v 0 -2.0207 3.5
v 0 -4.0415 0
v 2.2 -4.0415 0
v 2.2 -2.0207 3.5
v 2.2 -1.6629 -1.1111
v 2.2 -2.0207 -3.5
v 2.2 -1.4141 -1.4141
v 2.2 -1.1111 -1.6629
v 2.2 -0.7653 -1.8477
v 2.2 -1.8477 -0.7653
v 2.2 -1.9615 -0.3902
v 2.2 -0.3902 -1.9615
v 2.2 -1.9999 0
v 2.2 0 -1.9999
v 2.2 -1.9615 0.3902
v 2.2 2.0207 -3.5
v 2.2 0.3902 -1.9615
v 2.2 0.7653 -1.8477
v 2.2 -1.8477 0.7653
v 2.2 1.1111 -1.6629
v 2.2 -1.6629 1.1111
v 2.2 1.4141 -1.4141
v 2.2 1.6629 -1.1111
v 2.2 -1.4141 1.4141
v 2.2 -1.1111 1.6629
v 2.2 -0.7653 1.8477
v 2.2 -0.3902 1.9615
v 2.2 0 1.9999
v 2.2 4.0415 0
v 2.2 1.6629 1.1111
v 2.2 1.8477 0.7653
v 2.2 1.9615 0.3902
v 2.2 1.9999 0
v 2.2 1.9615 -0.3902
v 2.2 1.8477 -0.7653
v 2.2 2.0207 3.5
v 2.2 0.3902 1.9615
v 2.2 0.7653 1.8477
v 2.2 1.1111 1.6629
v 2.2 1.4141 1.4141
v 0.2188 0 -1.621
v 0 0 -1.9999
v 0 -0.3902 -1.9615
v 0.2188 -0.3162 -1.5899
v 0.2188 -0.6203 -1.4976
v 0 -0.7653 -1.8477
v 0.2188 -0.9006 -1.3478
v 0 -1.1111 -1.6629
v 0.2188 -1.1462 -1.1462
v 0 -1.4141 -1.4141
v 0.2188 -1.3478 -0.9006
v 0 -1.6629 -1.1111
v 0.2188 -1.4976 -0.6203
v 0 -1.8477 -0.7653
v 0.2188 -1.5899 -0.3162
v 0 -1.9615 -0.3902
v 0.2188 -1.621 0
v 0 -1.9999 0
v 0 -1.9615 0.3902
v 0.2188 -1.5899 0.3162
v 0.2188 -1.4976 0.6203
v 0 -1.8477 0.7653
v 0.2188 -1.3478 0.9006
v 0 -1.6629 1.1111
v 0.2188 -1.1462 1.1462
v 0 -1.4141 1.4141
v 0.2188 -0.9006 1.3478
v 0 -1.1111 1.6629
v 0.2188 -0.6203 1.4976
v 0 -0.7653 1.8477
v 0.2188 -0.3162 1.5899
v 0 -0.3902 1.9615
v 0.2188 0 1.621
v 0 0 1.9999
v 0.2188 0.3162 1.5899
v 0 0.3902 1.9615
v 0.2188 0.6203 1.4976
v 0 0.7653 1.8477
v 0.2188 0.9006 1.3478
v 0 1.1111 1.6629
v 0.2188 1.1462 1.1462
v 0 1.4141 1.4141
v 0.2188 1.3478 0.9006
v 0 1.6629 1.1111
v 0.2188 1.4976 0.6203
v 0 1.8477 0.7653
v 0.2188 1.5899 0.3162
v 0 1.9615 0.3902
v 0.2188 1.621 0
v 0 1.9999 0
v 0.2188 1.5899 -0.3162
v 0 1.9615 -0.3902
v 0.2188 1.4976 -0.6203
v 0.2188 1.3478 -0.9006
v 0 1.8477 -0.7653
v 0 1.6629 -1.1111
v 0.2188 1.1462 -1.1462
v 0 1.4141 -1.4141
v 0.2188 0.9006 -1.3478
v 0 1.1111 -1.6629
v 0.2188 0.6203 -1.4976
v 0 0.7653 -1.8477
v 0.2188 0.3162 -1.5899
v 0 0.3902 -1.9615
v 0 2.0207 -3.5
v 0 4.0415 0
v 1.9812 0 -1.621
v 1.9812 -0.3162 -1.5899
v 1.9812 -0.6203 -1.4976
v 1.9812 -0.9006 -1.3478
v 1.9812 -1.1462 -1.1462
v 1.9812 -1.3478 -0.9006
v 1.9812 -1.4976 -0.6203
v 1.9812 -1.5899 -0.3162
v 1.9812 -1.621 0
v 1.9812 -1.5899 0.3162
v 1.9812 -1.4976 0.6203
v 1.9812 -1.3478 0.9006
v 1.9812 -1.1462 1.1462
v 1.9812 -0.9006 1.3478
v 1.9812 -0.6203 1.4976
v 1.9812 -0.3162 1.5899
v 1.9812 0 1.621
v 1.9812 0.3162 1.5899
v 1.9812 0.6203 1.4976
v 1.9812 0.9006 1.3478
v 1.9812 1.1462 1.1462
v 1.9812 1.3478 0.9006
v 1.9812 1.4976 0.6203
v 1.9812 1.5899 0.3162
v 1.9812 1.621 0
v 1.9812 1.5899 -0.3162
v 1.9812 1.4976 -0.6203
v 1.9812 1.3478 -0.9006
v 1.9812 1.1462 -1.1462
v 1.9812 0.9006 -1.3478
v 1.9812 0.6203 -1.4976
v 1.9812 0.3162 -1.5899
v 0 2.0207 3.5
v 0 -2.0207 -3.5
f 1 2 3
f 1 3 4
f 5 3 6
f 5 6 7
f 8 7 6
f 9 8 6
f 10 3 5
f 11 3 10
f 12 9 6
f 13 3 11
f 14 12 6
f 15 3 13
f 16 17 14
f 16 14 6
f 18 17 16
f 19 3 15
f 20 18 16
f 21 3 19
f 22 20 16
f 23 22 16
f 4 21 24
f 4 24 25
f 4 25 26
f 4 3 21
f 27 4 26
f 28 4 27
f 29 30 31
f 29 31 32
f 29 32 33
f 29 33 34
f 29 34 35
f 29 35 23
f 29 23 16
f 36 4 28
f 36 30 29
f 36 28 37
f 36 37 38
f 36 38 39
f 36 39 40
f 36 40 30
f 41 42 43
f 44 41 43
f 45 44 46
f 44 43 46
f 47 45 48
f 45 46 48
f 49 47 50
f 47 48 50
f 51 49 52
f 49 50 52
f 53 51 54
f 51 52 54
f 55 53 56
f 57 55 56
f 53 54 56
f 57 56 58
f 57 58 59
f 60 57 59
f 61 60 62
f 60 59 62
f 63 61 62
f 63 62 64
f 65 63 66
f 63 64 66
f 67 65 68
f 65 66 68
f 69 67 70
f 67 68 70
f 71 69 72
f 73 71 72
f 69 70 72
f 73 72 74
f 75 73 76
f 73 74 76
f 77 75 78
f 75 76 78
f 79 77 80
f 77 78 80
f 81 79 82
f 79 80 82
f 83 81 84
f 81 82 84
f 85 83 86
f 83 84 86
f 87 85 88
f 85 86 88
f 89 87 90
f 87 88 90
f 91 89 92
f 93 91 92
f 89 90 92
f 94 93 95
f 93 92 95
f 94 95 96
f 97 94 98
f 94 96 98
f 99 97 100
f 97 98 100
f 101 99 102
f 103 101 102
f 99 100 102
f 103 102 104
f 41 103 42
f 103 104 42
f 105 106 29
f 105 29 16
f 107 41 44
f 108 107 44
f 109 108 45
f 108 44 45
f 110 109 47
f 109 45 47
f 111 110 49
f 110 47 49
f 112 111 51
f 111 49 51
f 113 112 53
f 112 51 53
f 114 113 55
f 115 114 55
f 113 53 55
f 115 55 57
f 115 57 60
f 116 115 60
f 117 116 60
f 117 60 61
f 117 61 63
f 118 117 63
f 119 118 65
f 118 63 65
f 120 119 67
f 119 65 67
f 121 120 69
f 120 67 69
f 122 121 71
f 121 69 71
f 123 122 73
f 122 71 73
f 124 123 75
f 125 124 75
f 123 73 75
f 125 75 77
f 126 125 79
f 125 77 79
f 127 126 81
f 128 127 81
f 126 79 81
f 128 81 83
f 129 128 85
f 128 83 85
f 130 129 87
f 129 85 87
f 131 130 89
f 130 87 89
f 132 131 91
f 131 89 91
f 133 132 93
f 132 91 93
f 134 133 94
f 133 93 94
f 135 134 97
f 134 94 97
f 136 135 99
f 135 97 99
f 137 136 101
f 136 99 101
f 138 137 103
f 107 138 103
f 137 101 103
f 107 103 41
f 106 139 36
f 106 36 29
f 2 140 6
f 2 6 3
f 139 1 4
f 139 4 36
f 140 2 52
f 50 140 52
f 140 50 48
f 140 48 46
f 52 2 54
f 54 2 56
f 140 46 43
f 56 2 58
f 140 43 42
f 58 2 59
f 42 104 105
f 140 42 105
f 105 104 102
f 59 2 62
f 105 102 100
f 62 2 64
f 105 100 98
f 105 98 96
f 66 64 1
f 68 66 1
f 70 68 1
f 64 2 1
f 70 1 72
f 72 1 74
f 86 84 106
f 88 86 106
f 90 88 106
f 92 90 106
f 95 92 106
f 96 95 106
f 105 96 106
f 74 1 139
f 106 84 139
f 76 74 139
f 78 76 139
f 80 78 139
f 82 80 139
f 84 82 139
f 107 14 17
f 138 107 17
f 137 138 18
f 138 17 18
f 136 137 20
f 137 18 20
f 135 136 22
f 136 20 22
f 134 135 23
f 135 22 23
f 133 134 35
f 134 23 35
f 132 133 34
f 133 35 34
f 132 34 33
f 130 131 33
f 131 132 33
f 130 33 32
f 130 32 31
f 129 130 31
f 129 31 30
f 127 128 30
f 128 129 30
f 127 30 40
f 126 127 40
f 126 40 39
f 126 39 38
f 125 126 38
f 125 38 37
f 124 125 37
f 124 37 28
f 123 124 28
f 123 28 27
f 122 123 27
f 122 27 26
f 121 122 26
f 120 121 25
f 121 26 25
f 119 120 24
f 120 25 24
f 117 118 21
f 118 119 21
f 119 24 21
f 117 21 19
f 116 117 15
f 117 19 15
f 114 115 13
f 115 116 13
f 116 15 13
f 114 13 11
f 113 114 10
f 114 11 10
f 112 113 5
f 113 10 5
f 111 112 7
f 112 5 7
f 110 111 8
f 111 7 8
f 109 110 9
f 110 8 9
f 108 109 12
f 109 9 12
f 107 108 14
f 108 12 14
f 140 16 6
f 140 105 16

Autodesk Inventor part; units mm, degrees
ref_plane "YZ Plane" through (0, 0, 0) normal (1, 0, 0) x (0, 1, 0)
ref_plane "XZ Plane" through (0, 0, 0) normal (0, 1, 0) x (-1, 0, 0)
sketch "Schizzo1" plane through (0, 0, 0) normal (1, 0, 0) x (0, 1, 0)
  line L0 (2.0207, -3.5) -> (-2.0207, -3.5)
  line L1 (-2.0207, -3.5) -> (-4.0415, 0)
  line L2 (-4.0415, 0) -> (-2.0207, 3.5)
  line L3 (-2.0207, 3.5) -> (2.0207, 3.5)
  line L4 (2.0207, 3.5) -> (4.0415, 0)
  line L5 (4.0415, 0) -> (2.0207, -3.5)
  point P0 (0, 0)
  point P1 (0, 0)
  dimension "d0" = 8.0829
extrude "Corpo" add sketch "Schizzo1" along normal blind 2.2
sketch "Schizzo2" plane through (2.2, 0, 0) normal (1, 0, 0) x (0, 0, -1)
  point P0 (0, 0)
hole "Filettatura" at (2.2, 0, 0) direction (-1, 0, 0) diameter 3.242 end through all thread size "M4x0.7" class "6H" standard "ISO Metric profile"
chamfer "Smusso2" distance 0.3789 angle 30 1 edges at (2.2, 0, 1.621) measured on face at (2.2, -2.4654, 1.4736)
chamfer "Smusso1" distance 0.3789 angle 30 1 edges at (0, 0, 1.621) measured on face at (0, -2.4654, 1.4736)
ref_plane "Work Plane1" through (-8.7167, 0, 0) normal (0, 0, -1) x (1, 0, 0)
equation "\"d0\" = 1.1547 * SW"
equation "\"d1\" = KOH"
equation "\"d12\" = -0.5 * GD1 + 0.5 * NND"
equation "\"d19\" = -0.5 * GD1 + 0.5 * NND"
equation "\"d10\" = -0.5 * GD1 + 0.5 * NND"
equation "\"d18\" = -0.5 * GD1 + 0.5 * NND"
equation "\"NND\" = 4"
equation "\"KOH\" = 2.2"
equation "\"SW\" = 7"
equation "\"GUL\" = 0.541266 * PTC"
equation "\"THREADDIA\" = 4"
equation "\"TOA\" = 30deg"
equation "\"PTC\" = 0.7"
equation "\"E0\" = 1.155 * SW"
equation "\"GAL\" = 0.541266 * PTC"
equation "\"GD1\" = 3.242228"
properties part number "AS 1474 - M4" material "Acciaio, Dolce"
